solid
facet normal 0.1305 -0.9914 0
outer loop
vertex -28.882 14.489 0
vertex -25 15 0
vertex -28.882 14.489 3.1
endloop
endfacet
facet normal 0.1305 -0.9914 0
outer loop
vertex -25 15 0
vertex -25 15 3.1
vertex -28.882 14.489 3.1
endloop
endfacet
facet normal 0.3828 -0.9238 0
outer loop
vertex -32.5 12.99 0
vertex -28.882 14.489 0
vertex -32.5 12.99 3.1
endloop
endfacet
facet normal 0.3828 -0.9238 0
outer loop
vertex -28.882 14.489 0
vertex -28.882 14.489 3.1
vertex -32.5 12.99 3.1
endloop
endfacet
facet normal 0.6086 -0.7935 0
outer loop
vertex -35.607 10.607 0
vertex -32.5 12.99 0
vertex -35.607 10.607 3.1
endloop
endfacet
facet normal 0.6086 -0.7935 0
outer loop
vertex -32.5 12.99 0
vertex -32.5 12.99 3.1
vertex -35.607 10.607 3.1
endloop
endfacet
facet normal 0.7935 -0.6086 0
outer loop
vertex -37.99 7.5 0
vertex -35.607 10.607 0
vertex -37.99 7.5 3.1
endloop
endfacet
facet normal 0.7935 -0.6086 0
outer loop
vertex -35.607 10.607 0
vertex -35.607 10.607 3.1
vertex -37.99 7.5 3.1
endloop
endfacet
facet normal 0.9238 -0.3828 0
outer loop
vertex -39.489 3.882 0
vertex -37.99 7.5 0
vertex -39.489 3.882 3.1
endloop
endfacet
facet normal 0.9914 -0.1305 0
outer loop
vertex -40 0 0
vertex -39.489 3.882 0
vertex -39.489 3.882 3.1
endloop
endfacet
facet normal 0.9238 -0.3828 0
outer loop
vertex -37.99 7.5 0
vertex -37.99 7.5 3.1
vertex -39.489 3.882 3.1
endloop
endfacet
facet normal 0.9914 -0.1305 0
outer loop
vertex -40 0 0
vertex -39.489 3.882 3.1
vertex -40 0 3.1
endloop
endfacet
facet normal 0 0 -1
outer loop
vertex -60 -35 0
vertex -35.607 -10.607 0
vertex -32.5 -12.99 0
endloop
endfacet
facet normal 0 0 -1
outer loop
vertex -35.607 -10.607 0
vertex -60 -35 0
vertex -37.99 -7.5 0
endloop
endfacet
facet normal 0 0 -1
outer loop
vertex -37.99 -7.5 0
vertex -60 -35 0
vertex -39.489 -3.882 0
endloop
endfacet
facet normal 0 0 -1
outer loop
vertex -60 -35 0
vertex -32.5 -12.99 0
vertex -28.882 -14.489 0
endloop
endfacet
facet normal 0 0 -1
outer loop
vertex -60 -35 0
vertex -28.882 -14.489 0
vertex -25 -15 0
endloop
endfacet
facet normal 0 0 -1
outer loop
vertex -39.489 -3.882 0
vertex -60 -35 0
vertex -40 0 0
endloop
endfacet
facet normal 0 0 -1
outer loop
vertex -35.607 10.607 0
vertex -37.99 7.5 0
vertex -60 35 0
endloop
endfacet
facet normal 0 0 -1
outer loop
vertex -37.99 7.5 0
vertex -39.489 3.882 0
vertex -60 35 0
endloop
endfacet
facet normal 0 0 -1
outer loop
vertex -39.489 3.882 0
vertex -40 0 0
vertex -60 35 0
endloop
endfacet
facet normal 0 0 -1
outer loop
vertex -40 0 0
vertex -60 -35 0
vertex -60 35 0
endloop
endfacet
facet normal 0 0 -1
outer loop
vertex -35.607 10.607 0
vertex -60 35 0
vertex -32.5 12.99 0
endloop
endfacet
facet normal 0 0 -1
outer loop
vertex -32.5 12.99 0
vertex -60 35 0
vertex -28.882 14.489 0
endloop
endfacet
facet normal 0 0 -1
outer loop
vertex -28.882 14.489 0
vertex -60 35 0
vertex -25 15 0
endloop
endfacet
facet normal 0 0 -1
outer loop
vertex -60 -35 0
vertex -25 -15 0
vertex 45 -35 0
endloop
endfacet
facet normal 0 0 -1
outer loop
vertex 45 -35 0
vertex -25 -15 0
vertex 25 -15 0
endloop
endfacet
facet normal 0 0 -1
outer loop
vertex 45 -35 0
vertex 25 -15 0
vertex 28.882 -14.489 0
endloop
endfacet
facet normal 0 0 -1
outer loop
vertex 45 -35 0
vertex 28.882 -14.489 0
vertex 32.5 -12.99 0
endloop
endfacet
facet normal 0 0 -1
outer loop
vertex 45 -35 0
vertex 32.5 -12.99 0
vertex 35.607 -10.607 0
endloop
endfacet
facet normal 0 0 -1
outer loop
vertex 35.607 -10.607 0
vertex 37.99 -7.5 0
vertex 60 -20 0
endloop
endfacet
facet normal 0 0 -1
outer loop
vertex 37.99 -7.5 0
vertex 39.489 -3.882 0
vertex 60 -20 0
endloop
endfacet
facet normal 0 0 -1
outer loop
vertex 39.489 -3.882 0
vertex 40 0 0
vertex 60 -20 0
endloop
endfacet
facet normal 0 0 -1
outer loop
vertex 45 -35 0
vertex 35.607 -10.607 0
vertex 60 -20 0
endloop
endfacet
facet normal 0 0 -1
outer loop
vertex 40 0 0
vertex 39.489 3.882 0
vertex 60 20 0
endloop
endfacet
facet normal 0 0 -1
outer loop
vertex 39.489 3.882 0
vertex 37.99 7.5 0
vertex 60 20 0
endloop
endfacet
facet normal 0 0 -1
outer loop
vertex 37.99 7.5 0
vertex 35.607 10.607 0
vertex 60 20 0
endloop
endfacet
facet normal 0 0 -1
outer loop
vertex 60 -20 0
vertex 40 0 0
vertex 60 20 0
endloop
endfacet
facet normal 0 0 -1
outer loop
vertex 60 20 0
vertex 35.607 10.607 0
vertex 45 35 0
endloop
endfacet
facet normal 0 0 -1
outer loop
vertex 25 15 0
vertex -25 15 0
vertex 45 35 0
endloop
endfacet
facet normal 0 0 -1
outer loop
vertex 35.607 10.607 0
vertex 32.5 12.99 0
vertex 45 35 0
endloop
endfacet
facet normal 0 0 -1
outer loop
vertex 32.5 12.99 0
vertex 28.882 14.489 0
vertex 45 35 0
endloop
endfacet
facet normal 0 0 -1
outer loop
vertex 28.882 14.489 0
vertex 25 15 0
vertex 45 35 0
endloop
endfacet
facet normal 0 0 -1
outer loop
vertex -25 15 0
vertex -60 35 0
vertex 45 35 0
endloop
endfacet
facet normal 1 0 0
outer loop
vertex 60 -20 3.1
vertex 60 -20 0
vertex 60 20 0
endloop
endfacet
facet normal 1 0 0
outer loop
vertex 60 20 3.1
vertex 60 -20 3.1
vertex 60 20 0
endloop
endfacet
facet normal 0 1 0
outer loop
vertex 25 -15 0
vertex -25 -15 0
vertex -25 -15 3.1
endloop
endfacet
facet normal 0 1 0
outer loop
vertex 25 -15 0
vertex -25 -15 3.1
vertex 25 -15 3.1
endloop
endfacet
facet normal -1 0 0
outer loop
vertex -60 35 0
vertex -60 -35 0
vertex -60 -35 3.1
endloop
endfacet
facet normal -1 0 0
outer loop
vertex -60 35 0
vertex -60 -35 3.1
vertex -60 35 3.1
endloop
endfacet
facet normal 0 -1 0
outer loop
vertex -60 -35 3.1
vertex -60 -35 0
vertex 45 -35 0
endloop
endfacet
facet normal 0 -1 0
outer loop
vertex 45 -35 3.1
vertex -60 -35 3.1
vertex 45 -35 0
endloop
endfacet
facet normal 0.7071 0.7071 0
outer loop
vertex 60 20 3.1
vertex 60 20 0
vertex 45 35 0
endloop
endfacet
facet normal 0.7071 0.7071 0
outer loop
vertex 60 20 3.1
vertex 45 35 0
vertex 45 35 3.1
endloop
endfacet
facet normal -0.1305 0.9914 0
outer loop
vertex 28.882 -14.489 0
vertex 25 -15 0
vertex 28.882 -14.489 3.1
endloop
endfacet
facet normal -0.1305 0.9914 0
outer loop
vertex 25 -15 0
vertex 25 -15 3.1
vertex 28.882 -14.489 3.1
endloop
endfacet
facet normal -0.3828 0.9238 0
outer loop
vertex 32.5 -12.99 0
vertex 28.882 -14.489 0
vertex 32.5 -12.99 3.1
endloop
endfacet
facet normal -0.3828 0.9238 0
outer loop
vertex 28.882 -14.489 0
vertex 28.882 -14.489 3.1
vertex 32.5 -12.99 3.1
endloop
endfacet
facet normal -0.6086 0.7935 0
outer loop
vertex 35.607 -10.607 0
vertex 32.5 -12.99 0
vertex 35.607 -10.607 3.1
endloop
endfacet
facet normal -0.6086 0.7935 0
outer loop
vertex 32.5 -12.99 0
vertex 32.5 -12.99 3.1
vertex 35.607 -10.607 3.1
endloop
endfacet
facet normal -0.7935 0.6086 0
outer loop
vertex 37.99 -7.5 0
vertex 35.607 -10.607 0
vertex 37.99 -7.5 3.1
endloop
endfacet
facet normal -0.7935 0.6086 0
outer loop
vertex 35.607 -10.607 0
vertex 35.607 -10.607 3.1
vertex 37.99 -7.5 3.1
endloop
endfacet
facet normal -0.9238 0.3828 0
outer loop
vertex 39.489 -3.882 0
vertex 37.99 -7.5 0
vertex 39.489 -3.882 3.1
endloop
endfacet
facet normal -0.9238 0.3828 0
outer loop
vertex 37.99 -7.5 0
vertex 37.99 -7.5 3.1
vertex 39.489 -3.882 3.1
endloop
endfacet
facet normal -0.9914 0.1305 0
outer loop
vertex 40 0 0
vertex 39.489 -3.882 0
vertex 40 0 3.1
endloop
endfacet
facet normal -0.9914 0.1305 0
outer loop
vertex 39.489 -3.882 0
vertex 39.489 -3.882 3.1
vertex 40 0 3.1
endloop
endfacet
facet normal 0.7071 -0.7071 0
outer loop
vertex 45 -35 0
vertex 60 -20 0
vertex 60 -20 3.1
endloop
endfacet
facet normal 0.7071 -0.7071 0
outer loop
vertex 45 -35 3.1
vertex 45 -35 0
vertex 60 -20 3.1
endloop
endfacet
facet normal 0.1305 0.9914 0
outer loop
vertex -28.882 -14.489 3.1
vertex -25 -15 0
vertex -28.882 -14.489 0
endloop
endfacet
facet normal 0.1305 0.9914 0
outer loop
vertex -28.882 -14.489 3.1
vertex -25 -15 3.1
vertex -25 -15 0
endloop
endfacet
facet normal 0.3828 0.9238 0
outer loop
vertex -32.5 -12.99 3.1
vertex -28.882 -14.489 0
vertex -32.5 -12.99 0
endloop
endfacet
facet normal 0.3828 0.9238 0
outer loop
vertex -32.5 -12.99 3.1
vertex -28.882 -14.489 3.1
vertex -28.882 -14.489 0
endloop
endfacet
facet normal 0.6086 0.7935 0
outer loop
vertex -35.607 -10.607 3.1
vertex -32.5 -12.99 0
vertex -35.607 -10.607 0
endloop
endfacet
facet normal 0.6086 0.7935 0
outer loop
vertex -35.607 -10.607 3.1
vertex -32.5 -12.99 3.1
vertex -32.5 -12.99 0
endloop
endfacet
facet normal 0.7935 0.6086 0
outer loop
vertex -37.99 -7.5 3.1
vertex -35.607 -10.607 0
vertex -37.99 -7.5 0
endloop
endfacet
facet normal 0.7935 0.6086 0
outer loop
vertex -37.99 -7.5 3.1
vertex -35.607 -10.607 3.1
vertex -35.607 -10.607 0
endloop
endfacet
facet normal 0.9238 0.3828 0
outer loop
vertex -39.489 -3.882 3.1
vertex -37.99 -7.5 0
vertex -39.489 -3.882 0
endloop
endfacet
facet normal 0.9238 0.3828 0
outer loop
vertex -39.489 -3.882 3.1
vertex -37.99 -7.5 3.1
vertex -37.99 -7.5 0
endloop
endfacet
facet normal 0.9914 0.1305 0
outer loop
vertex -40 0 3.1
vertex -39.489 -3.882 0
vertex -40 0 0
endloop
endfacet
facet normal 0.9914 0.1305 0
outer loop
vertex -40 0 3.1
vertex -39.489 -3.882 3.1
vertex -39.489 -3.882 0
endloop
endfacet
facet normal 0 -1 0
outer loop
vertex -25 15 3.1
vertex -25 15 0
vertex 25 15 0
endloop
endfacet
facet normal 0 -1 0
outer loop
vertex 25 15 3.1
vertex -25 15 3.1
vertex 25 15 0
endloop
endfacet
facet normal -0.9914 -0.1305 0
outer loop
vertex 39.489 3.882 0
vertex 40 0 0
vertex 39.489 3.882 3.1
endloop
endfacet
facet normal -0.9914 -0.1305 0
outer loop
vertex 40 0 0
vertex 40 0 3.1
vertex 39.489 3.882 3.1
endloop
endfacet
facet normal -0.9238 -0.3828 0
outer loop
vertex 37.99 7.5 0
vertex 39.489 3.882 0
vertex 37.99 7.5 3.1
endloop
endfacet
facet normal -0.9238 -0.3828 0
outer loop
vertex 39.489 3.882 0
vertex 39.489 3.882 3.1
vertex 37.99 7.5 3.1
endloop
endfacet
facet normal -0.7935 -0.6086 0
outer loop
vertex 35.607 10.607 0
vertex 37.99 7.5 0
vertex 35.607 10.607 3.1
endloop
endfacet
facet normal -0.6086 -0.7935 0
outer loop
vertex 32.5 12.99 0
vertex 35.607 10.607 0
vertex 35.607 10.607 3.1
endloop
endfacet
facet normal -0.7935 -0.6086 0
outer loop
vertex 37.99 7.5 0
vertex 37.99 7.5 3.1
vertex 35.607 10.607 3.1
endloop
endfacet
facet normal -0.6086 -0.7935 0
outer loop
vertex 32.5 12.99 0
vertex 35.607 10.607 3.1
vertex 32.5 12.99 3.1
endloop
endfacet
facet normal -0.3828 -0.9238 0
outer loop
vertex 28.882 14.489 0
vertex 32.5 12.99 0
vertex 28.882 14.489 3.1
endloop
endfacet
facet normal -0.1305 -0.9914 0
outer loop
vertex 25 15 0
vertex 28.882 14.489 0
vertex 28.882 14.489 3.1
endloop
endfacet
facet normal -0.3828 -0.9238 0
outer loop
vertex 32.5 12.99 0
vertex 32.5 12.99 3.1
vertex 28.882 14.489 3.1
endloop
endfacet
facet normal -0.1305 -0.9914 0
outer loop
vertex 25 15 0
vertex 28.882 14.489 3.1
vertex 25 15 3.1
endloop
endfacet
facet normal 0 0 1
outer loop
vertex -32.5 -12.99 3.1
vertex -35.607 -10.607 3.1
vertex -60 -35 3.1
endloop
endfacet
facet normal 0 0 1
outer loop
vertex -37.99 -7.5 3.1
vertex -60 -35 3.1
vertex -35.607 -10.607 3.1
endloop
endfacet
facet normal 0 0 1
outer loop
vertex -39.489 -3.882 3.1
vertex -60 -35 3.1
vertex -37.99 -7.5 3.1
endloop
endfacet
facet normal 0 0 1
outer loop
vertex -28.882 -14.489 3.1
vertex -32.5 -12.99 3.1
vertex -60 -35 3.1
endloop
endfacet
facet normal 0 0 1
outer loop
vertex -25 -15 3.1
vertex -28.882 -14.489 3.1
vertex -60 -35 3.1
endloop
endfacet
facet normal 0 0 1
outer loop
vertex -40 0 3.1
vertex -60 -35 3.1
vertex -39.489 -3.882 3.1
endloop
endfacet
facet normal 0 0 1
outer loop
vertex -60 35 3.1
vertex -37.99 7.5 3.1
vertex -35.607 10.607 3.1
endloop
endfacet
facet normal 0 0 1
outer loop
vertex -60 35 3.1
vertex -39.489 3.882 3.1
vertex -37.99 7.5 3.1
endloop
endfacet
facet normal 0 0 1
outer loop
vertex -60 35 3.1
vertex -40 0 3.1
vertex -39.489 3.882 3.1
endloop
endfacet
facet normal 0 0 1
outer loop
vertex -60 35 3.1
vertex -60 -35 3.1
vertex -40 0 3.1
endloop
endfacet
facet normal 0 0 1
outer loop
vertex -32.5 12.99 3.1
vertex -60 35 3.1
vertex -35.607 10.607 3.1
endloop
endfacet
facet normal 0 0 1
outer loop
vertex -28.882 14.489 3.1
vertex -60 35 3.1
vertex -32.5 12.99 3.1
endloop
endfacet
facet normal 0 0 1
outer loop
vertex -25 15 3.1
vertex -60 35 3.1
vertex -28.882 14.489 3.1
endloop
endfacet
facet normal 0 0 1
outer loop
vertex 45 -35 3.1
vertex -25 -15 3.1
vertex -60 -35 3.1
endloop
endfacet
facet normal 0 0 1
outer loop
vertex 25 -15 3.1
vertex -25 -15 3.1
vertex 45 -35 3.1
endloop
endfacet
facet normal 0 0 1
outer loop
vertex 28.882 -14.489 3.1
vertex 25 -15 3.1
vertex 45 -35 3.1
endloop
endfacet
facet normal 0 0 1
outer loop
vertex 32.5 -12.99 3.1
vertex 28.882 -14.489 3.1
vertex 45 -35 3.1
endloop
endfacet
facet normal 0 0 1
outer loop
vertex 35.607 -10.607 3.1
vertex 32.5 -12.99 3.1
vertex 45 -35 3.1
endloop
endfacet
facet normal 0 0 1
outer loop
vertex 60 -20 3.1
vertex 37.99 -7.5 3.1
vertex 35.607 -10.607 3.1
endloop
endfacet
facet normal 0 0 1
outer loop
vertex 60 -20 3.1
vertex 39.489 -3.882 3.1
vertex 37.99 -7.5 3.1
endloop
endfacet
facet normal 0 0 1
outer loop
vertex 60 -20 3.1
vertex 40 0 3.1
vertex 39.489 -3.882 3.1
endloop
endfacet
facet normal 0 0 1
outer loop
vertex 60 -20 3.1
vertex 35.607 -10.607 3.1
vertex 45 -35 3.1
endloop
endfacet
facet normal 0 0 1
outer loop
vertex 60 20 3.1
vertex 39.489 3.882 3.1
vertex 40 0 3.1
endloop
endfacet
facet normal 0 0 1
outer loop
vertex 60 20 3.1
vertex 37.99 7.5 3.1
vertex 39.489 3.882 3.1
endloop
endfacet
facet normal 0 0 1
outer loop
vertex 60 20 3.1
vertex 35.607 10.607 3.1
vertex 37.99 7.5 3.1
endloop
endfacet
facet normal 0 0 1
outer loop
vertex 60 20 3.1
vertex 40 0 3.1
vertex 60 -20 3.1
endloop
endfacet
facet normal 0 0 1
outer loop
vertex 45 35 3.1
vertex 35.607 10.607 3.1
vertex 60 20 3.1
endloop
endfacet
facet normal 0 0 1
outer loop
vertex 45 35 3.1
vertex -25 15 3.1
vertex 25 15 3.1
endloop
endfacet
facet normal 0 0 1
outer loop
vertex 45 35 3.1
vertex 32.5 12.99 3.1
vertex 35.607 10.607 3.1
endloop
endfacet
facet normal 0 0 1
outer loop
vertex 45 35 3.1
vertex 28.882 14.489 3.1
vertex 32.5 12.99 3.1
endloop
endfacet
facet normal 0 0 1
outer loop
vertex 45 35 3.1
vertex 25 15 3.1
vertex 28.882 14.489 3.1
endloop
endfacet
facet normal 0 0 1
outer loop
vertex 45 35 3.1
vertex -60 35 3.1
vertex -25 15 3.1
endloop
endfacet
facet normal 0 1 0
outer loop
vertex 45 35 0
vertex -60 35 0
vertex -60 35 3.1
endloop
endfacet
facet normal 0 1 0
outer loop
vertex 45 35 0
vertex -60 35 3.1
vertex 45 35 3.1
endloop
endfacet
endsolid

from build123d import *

# Parameters (mm, degrees)
SKETCH1_W           = 120
SKETCH1_H           = 70
SKETCH1_W_2         = 80
SKETCH1_H_2         = 30
BOSS_EXTRUDE1_DEPTH = 3.1
FILLET1_R           = 15
CHAMFER1_SIZE       = 15


with BuildPart() as part:
    # Sketch1 → Boss-Extrude1 (new body)
    with BuildSketch(Plane.XY):
        Rectangle(SKETCH1_W, SKETCH1_H)
        Rectangle(SKETCH1_W_2, SKETCH1_H_2, mode=Mode.SUBTRACT)
    extrude(amount=BOSS_EXTRUDE1_DEPTH)

    # Fillet1
    fillet1_edges = [part.edges().sort_by_distance(p)[0] for p in [
        (40, -15, 1.55),
        (40, 15, 1.55),
        (-40, 15, 1.55),
        (-40, -15, 1.55),
    ]]
    fillet(fillet1_edges, radius=FILLET1_R - 0.0001)  # a hair under: the kernel refuses the full size

    # Chamfer1
    chamfer1_edges = [part.edges().sort_by_distance(p)[0] for p in [
        (60, -35, 1.55),
        (60, 35, 1.55),
    ]]
    chamfer(chamfer1_edges, length=CHAMFER1_SIZE)


solid = part.part
